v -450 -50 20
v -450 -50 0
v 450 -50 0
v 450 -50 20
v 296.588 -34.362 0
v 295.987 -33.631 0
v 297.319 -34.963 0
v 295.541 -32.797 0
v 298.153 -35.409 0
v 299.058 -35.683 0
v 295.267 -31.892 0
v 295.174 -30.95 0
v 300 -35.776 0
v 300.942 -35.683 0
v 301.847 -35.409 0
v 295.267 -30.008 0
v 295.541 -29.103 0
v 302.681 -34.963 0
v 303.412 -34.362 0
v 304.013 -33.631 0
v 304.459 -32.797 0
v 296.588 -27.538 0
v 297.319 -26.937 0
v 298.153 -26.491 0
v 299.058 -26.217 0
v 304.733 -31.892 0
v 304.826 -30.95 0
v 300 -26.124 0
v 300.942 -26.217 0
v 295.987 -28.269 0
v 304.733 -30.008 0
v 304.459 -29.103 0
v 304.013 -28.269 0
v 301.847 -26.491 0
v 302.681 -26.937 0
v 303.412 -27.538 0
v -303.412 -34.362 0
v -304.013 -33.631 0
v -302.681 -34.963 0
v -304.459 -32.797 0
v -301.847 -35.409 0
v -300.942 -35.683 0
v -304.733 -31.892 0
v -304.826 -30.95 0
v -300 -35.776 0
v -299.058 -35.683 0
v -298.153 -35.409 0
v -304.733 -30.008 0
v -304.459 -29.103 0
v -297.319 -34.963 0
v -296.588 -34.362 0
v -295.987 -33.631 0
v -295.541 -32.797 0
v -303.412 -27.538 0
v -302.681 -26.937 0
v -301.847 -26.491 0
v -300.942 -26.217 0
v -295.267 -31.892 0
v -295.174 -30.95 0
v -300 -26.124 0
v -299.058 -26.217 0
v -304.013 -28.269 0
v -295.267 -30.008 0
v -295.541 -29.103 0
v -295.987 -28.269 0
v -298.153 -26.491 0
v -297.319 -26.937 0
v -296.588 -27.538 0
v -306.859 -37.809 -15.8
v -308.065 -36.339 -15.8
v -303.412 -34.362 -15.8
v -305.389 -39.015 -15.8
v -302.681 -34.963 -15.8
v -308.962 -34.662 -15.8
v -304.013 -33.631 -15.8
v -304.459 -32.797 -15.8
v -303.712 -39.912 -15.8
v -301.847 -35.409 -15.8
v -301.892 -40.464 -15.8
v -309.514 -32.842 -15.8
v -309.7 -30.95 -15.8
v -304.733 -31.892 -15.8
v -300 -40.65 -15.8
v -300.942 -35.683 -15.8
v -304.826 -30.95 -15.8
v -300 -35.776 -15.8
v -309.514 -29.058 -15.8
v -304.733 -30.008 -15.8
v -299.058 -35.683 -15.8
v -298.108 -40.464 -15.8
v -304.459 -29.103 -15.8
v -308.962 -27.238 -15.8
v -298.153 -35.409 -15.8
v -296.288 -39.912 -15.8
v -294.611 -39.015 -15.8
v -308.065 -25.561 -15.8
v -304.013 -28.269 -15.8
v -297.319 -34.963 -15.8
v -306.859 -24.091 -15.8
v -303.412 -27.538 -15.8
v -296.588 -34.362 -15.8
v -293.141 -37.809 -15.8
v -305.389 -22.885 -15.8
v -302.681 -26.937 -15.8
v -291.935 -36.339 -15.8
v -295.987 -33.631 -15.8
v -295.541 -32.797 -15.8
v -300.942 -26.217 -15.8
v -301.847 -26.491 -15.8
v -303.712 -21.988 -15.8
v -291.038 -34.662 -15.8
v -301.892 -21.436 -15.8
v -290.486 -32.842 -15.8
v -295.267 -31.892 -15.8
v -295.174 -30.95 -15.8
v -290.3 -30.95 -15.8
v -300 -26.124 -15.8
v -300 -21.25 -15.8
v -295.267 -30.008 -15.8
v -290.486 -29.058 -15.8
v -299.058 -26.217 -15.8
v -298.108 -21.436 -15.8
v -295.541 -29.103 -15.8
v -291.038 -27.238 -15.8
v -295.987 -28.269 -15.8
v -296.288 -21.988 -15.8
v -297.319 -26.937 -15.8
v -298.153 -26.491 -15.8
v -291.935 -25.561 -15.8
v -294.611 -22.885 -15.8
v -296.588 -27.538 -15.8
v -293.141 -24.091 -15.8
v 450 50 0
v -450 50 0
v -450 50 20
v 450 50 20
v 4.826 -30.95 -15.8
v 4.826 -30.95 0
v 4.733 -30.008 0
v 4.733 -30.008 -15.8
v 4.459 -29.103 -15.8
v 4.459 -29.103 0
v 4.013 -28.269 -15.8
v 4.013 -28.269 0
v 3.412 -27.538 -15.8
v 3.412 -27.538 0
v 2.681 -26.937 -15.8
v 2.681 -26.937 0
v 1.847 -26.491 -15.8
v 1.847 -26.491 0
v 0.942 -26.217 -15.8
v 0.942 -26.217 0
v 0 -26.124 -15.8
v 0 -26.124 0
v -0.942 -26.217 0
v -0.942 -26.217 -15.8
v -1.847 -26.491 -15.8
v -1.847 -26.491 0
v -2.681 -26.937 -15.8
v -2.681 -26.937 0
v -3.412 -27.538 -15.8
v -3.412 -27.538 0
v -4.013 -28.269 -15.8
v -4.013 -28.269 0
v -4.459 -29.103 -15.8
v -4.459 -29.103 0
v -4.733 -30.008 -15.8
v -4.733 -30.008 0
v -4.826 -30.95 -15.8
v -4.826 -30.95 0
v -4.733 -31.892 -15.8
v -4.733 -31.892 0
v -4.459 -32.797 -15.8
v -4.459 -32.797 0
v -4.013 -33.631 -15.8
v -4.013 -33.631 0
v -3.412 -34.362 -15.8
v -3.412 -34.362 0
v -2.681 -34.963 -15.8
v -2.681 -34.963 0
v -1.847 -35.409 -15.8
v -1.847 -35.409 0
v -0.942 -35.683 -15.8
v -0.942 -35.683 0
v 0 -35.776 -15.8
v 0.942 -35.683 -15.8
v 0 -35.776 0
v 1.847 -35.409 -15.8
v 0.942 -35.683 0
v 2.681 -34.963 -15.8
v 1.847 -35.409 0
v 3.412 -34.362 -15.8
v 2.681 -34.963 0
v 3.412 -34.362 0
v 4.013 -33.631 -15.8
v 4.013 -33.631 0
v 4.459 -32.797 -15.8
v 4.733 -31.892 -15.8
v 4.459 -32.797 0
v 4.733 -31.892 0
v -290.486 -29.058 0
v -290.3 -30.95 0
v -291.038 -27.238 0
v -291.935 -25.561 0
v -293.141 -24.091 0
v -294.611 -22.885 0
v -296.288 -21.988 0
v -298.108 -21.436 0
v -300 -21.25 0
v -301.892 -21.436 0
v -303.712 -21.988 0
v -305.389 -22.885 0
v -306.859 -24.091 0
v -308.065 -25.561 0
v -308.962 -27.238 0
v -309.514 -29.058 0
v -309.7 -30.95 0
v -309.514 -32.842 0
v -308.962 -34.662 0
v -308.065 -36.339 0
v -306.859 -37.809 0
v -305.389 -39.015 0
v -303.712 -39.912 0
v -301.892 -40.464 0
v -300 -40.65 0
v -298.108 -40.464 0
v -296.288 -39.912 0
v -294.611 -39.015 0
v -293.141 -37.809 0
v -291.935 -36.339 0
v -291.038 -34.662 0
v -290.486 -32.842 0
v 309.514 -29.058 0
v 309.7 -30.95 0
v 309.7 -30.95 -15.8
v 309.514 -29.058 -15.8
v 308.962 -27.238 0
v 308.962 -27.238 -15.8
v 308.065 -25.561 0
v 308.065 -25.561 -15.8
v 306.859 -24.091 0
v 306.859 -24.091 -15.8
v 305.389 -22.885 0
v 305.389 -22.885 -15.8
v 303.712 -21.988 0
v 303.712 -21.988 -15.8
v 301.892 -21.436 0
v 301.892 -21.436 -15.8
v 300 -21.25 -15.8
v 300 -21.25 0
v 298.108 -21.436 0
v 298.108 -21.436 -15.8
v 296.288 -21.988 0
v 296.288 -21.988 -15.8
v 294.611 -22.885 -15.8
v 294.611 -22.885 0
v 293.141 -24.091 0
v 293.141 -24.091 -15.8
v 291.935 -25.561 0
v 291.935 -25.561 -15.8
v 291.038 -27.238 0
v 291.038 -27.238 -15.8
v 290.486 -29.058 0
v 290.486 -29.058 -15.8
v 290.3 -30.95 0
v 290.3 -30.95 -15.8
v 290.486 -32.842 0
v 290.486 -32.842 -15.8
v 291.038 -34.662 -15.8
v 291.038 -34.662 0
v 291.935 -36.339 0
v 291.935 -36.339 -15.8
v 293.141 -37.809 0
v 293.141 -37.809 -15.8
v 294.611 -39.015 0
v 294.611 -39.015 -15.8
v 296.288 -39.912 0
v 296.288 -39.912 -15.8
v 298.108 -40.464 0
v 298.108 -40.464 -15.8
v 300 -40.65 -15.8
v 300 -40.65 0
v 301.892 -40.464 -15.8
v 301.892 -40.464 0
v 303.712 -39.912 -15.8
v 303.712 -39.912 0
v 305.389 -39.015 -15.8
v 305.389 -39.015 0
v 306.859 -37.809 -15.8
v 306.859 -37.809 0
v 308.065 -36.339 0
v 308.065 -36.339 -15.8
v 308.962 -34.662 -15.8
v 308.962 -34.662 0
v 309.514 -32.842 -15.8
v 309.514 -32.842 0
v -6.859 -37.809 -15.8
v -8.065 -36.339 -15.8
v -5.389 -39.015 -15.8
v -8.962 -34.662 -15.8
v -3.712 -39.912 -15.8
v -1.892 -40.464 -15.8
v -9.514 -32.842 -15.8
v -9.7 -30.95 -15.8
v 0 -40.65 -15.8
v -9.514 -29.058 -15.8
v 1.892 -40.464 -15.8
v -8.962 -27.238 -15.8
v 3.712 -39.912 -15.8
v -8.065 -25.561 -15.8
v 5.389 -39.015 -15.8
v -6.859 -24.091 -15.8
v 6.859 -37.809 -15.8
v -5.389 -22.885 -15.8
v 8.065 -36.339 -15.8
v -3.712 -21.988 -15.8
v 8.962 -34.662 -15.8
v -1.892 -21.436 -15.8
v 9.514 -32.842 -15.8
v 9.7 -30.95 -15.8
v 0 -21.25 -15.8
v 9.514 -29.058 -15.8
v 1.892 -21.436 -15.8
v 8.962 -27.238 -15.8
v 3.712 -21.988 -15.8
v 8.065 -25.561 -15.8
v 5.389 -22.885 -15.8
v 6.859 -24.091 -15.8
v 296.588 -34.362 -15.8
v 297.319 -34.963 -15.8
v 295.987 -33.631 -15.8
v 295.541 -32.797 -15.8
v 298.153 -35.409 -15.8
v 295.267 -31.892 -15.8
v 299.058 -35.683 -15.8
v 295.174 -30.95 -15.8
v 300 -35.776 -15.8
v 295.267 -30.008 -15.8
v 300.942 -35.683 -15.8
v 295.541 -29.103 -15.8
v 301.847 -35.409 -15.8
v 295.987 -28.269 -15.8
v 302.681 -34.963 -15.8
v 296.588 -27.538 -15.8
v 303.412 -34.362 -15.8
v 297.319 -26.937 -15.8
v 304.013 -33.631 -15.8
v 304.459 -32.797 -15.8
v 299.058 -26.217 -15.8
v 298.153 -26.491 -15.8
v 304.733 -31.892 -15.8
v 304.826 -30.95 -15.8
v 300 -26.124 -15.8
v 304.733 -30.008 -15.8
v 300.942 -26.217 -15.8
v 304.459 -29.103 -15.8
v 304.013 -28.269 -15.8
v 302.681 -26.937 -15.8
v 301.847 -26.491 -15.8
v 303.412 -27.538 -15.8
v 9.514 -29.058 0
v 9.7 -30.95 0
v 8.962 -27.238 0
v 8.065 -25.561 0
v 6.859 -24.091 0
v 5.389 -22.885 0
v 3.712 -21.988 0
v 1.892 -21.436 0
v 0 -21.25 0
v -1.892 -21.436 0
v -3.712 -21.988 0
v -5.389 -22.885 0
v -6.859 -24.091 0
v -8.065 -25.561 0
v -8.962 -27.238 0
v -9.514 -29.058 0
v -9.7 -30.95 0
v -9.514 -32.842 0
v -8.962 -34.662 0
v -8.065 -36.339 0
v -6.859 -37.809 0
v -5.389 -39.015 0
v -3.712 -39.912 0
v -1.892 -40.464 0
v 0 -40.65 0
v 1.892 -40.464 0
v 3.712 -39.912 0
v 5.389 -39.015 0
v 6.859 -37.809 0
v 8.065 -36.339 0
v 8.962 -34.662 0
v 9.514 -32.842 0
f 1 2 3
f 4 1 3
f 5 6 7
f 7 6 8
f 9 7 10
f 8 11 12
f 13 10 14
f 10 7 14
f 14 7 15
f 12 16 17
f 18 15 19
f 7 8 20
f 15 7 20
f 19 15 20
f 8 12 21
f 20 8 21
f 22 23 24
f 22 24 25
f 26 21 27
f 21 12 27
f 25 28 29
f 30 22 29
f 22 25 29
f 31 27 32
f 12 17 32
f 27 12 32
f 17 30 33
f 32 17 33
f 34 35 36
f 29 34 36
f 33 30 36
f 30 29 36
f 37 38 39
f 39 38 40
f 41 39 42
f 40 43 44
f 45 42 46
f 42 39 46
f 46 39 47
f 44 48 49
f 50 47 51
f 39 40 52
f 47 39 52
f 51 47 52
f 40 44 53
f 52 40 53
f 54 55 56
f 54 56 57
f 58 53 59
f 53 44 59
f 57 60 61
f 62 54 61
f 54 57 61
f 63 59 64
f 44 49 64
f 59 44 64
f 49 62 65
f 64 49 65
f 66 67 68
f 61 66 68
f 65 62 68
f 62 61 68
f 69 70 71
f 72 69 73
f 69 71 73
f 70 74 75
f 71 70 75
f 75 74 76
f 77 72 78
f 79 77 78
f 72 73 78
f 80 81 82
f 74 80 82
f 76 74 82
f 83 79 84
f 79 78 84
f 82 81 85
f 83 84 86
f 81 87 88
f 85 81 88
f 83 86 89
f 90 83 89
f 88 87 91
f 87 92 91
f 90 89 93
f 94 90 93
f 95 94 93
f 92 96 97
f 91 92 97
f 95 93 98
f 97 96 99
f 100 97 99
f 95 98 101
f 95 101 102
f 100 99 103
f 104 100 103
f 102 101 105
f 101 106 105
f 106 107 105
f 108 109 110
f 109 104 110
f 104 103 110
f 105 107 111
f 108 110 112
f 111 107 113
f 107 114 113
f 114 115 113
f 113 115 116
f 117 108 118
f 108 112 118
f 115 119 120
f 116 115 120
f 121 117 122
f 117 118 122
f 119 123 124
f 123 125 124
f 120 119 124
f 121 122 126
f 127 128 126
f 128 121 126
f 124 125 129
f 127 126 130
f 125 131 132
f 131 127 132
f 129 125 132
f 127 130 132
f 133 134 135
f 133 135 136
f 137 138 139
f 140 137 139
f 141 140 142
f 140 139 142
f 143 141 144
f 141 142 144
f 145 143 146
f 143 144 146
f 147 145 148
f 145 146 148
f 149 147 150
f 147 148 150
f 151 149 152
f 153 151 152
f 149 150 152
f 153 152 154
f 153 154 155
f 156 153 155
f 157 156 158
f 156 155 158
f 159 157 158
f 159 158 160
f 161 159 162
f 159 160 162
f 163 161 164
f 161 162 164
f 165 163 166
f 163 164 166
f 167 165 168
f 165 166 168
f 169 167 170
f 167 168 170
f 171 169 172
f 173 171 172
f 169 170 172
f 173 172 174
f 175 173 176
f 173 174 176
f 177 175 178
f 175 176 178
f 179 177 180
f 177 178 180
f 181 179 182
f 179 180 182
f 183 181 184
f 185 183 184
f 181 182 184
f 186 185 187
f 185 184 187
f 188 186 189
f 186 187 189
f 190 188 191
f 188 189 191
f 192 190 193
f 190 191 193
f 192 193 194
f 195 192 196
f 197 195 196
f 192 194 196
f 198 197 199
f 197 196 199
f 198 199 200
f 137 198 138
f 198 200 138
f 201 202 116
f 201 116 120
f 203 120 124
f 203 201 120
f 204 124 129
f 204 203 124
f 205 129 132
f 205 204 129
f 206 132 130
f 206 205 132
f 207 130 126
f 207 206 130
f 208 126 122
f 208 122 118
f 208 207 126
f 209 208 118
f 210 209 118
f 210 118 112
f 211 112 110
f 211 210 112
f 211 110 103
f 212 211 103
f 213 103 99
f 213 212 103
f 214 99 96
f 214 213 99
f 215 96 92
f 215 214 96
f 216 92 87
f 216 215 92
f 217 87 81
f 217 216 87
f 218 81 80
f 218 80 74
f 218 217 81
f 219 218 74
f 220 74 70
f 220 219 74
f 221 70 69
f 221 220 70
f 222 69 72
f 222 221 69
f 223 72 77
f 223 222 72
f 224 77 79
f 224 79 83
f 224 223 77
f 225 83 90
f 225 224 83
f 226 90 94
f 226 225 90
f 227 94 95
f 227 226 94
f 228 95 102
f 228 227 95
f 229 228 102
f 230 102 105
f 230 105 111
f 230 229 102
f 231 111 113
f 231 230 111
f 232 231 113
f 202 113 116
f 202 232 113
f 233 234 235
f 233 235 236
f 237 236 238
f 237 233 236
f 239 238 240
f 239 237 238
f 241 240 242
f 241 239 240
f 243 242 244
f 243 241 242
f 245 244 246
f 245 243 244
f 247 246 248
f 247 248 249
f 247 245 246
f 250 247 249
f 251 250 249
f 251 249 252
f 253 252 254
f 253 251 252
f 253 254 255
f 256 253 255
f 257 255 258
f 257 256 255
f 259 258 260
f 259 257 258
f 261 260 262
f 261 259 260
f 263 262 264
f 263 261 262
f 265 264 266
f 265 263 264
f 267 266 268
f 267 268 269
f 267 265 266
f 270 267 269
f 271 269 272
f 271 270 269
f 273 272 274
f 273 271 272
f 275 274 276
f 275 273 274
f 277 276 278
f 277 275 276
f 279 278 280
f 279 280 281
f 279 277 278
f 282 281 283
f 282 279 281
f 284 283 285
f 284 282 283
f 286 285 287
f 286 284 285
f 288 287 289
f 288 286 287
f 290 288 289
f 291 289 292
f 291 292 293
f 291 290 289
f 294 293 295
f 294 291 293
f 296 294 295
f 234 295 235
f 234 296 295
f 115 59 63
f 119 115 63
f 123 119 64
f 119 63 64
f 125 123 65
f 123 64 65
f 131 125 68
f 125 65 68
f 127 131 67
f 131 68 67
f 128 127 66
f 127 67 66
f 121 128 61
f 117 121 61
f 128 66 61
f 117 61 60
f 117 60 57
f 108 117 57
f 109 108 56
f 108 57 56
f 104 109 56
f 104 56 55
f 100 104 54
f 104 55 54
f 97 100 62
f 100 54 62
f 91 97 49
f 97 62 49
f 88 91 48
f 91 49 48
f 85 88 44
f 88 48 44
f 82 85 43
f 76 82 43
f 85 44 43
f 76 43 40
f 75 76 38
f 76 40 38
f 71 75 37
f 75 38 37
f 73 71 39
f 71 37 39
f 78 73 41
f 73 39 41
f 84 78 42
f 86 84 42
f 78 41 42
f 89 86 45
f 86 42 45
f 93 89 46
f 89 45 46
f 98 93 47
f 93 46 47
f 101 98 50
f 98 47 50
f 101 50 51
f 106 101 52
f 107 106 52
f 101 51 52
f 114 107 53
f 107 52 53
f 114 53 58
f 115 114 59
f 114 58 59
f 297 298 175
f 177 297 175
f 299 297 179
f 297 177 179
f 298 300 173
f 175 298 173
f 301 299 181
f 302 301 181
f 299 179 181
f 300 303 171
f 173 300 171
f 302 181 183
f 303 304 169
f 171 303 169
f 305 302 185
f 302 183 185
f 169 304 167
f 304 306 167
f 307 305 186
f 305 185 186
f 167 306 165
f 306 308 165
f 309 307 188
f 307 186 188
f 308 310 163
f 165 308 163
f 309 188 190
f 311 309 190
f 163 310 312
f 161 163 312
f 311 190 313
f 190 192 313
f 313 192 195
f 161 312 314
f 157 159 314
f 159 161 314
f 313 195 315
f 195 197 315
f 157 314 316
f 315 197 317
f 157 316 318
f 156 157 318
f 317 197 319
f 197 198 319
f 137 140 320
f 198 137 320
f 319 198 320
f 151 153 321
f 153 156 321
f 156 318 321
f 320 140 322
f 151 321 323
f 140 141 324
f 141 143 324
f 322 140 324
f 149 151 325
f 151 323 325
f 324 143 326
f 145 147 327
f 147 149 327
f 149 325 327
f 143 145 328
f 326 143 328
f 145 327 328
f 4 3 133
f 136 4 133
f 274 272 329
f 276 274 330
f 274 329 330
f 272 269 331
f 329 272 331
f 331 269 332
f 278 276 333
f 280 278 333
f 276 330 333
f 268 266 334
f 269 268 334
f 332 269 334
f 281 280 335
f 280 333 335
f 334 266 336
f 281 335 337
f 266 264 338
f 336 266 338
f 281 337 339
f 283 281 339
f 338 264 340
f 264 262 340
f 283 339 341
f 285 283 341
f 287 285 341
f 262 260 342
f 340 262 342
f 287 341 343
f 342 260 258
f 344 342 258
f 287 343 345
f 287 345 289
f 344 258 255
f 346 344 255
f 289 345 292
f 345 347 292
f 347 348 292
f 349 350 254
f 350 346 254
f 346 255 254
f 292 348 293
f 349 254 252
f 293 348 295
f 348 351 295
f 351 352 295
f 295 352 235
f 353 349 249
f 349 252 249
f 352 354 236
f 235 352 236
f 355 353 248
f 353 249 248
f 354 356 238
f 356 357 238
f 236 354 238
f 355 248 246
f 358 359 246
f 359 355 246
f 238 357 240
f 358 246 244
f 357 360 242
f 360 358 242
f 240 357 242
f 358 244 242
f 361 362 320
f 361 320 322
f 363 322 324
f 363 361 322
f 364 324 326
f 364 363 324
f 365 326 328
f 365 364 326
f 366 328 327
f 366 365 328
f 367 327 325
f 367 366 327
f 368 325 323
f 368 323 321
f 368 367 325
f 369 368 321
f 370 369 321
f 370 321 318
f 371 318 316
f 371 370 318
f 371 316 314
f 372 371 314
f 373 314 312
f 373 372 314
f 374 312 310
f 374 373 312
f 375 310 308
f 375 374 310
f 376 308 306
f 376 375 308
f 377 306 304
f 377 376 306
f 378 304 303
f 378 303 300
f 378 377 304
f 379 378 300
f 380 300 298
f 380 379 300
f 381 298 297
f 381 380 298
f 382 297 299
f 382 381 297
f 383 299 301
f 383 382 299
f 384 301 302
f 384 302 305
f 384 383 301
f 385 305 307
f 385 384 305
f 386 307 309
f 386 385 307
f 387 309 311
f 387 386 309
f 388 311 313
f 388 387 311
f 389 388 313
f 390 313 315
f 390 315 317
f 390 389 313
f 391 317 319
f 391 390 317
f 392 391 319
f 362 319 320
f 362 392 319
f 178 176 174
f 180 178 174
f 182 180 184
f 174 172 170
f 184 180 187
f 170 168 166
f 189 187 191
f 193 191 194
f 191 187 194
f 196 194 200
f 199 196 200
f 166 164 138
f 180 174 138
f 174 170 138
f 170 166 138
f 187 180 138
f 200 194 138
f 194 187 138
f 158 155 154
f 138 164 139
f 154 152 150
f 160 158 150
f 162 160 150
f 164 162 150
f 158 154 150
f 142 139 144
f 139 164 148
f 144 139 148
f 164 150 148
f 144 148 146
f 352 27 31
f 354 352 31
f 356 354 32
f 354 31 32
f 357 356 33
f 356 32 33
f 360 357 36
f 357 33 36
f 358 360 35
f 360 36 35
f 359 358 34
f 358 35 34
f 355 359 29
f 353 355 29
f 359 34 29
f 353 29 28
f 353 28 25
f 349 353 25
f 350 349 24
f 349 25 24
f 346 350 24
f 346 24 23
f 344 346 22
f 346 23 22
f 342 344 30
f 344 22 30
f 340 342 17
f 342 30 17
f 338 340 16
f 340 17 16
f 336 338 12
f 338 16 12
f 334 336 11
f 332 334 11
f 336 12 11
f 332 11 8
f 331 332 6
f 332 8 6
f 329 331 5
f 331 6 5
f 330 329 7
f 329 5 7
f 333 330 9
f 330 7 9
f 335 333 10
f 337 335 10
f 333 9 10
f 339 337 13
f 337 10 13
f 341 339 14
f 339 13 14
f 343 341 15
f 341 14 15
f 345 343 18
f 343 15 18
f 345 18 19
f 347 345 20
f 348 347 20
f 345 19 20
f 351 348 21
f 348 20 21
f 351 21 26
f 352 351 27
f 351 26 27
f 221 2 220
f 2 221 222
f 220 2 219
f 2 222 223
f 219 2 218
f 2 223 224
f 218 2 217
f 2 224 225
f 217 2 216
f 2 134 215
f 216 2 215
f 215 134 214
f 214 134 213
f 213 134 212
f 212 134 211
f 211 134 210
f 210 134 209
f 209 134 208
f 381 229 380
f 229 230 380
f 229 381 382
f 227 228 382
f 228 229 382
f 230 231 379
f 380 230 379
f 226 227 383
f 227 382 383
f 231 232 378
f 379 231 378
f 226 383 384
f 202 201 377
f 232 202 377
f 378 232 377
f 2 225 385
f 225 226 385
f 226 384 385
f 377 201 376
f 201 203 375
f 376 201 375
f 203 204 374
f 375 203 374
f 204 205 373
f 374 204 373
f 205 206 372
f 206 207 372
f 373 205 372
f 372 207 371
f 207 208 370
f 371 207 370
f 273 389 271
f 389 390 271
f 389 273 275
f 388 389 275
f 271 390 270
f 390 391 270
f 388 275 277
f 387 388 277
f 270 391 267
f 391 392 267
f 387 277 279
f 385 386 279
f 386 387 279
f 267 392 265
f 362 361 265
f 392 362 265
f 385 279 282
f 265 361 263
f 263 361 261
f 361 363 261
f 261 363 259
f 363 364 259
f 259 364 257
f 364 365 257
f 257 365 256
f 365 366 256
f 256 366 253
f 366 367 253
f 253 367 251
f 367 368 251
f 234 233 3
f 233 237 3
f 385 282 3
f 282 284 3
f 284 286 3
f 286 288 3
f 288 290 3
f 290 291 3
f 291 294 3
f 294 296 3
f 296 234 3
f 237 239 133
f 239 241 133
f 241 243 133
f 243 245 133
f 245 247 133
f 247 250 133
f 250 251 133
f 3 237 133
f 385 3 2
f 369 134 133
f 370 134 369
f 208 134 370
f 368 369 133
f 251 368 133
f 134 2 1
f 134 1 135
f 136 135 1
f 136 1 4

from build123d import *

# Parameters (mm, degrees)
SKETCH1_W           = 900
SKETCH1_H           = 100
BOSS_EXTRUDE1_DEPTH = 20
SKETCH2_R           = 9.7
SKETCH2_R_2         = 4.826
BOSS_EXTRUDE2_DEPTH = 15.8


with BuildPart() as part:
    # Sketch1 → Boss-Extrude1 (new body)
    with BuildSketch(Plane.XY):
        Rectangle(SKETCH1_W, SKETCH1_H)
    extrude(amount=BOSS_EXTRUDE1_DEPTH)

    # Sketch2 → Boss-Extrude2 (add)
    # profile 1 of 3: a face of its own
    with BuildSketch(Plane.XY):
        with Locations((-300, -30.95)):
            Circle(SKETCH2_R)
        with Locations((-300, -30.95)):
            Circle(SKETCH2_R_2, mode=Mode.SUBTRACT)
    # profile 2 of 3: a face of its own
    with BuildSketch(Plane.XY):
        with Locations((0, -30.95)):
            Circle(SKETCH2_R)
        with Locations((0, -30.95)):
            Circle(SKETCH2_R_2, mode=Mode.SUBTRACT)
    # profile 3 of 3: a face of its own
    with BuildSketch(Plane.XY):
        with Locations((300, -30.95)):
            Circle(SKETCH2_R)
        with Locations((300, -30.95)):
            Circle(SKETCH2_R_2, mode=Mode.SUBTRACT)
    extrude(amount=-BOSS_EXTRUDE2_DEPTH)


solid = part.part
